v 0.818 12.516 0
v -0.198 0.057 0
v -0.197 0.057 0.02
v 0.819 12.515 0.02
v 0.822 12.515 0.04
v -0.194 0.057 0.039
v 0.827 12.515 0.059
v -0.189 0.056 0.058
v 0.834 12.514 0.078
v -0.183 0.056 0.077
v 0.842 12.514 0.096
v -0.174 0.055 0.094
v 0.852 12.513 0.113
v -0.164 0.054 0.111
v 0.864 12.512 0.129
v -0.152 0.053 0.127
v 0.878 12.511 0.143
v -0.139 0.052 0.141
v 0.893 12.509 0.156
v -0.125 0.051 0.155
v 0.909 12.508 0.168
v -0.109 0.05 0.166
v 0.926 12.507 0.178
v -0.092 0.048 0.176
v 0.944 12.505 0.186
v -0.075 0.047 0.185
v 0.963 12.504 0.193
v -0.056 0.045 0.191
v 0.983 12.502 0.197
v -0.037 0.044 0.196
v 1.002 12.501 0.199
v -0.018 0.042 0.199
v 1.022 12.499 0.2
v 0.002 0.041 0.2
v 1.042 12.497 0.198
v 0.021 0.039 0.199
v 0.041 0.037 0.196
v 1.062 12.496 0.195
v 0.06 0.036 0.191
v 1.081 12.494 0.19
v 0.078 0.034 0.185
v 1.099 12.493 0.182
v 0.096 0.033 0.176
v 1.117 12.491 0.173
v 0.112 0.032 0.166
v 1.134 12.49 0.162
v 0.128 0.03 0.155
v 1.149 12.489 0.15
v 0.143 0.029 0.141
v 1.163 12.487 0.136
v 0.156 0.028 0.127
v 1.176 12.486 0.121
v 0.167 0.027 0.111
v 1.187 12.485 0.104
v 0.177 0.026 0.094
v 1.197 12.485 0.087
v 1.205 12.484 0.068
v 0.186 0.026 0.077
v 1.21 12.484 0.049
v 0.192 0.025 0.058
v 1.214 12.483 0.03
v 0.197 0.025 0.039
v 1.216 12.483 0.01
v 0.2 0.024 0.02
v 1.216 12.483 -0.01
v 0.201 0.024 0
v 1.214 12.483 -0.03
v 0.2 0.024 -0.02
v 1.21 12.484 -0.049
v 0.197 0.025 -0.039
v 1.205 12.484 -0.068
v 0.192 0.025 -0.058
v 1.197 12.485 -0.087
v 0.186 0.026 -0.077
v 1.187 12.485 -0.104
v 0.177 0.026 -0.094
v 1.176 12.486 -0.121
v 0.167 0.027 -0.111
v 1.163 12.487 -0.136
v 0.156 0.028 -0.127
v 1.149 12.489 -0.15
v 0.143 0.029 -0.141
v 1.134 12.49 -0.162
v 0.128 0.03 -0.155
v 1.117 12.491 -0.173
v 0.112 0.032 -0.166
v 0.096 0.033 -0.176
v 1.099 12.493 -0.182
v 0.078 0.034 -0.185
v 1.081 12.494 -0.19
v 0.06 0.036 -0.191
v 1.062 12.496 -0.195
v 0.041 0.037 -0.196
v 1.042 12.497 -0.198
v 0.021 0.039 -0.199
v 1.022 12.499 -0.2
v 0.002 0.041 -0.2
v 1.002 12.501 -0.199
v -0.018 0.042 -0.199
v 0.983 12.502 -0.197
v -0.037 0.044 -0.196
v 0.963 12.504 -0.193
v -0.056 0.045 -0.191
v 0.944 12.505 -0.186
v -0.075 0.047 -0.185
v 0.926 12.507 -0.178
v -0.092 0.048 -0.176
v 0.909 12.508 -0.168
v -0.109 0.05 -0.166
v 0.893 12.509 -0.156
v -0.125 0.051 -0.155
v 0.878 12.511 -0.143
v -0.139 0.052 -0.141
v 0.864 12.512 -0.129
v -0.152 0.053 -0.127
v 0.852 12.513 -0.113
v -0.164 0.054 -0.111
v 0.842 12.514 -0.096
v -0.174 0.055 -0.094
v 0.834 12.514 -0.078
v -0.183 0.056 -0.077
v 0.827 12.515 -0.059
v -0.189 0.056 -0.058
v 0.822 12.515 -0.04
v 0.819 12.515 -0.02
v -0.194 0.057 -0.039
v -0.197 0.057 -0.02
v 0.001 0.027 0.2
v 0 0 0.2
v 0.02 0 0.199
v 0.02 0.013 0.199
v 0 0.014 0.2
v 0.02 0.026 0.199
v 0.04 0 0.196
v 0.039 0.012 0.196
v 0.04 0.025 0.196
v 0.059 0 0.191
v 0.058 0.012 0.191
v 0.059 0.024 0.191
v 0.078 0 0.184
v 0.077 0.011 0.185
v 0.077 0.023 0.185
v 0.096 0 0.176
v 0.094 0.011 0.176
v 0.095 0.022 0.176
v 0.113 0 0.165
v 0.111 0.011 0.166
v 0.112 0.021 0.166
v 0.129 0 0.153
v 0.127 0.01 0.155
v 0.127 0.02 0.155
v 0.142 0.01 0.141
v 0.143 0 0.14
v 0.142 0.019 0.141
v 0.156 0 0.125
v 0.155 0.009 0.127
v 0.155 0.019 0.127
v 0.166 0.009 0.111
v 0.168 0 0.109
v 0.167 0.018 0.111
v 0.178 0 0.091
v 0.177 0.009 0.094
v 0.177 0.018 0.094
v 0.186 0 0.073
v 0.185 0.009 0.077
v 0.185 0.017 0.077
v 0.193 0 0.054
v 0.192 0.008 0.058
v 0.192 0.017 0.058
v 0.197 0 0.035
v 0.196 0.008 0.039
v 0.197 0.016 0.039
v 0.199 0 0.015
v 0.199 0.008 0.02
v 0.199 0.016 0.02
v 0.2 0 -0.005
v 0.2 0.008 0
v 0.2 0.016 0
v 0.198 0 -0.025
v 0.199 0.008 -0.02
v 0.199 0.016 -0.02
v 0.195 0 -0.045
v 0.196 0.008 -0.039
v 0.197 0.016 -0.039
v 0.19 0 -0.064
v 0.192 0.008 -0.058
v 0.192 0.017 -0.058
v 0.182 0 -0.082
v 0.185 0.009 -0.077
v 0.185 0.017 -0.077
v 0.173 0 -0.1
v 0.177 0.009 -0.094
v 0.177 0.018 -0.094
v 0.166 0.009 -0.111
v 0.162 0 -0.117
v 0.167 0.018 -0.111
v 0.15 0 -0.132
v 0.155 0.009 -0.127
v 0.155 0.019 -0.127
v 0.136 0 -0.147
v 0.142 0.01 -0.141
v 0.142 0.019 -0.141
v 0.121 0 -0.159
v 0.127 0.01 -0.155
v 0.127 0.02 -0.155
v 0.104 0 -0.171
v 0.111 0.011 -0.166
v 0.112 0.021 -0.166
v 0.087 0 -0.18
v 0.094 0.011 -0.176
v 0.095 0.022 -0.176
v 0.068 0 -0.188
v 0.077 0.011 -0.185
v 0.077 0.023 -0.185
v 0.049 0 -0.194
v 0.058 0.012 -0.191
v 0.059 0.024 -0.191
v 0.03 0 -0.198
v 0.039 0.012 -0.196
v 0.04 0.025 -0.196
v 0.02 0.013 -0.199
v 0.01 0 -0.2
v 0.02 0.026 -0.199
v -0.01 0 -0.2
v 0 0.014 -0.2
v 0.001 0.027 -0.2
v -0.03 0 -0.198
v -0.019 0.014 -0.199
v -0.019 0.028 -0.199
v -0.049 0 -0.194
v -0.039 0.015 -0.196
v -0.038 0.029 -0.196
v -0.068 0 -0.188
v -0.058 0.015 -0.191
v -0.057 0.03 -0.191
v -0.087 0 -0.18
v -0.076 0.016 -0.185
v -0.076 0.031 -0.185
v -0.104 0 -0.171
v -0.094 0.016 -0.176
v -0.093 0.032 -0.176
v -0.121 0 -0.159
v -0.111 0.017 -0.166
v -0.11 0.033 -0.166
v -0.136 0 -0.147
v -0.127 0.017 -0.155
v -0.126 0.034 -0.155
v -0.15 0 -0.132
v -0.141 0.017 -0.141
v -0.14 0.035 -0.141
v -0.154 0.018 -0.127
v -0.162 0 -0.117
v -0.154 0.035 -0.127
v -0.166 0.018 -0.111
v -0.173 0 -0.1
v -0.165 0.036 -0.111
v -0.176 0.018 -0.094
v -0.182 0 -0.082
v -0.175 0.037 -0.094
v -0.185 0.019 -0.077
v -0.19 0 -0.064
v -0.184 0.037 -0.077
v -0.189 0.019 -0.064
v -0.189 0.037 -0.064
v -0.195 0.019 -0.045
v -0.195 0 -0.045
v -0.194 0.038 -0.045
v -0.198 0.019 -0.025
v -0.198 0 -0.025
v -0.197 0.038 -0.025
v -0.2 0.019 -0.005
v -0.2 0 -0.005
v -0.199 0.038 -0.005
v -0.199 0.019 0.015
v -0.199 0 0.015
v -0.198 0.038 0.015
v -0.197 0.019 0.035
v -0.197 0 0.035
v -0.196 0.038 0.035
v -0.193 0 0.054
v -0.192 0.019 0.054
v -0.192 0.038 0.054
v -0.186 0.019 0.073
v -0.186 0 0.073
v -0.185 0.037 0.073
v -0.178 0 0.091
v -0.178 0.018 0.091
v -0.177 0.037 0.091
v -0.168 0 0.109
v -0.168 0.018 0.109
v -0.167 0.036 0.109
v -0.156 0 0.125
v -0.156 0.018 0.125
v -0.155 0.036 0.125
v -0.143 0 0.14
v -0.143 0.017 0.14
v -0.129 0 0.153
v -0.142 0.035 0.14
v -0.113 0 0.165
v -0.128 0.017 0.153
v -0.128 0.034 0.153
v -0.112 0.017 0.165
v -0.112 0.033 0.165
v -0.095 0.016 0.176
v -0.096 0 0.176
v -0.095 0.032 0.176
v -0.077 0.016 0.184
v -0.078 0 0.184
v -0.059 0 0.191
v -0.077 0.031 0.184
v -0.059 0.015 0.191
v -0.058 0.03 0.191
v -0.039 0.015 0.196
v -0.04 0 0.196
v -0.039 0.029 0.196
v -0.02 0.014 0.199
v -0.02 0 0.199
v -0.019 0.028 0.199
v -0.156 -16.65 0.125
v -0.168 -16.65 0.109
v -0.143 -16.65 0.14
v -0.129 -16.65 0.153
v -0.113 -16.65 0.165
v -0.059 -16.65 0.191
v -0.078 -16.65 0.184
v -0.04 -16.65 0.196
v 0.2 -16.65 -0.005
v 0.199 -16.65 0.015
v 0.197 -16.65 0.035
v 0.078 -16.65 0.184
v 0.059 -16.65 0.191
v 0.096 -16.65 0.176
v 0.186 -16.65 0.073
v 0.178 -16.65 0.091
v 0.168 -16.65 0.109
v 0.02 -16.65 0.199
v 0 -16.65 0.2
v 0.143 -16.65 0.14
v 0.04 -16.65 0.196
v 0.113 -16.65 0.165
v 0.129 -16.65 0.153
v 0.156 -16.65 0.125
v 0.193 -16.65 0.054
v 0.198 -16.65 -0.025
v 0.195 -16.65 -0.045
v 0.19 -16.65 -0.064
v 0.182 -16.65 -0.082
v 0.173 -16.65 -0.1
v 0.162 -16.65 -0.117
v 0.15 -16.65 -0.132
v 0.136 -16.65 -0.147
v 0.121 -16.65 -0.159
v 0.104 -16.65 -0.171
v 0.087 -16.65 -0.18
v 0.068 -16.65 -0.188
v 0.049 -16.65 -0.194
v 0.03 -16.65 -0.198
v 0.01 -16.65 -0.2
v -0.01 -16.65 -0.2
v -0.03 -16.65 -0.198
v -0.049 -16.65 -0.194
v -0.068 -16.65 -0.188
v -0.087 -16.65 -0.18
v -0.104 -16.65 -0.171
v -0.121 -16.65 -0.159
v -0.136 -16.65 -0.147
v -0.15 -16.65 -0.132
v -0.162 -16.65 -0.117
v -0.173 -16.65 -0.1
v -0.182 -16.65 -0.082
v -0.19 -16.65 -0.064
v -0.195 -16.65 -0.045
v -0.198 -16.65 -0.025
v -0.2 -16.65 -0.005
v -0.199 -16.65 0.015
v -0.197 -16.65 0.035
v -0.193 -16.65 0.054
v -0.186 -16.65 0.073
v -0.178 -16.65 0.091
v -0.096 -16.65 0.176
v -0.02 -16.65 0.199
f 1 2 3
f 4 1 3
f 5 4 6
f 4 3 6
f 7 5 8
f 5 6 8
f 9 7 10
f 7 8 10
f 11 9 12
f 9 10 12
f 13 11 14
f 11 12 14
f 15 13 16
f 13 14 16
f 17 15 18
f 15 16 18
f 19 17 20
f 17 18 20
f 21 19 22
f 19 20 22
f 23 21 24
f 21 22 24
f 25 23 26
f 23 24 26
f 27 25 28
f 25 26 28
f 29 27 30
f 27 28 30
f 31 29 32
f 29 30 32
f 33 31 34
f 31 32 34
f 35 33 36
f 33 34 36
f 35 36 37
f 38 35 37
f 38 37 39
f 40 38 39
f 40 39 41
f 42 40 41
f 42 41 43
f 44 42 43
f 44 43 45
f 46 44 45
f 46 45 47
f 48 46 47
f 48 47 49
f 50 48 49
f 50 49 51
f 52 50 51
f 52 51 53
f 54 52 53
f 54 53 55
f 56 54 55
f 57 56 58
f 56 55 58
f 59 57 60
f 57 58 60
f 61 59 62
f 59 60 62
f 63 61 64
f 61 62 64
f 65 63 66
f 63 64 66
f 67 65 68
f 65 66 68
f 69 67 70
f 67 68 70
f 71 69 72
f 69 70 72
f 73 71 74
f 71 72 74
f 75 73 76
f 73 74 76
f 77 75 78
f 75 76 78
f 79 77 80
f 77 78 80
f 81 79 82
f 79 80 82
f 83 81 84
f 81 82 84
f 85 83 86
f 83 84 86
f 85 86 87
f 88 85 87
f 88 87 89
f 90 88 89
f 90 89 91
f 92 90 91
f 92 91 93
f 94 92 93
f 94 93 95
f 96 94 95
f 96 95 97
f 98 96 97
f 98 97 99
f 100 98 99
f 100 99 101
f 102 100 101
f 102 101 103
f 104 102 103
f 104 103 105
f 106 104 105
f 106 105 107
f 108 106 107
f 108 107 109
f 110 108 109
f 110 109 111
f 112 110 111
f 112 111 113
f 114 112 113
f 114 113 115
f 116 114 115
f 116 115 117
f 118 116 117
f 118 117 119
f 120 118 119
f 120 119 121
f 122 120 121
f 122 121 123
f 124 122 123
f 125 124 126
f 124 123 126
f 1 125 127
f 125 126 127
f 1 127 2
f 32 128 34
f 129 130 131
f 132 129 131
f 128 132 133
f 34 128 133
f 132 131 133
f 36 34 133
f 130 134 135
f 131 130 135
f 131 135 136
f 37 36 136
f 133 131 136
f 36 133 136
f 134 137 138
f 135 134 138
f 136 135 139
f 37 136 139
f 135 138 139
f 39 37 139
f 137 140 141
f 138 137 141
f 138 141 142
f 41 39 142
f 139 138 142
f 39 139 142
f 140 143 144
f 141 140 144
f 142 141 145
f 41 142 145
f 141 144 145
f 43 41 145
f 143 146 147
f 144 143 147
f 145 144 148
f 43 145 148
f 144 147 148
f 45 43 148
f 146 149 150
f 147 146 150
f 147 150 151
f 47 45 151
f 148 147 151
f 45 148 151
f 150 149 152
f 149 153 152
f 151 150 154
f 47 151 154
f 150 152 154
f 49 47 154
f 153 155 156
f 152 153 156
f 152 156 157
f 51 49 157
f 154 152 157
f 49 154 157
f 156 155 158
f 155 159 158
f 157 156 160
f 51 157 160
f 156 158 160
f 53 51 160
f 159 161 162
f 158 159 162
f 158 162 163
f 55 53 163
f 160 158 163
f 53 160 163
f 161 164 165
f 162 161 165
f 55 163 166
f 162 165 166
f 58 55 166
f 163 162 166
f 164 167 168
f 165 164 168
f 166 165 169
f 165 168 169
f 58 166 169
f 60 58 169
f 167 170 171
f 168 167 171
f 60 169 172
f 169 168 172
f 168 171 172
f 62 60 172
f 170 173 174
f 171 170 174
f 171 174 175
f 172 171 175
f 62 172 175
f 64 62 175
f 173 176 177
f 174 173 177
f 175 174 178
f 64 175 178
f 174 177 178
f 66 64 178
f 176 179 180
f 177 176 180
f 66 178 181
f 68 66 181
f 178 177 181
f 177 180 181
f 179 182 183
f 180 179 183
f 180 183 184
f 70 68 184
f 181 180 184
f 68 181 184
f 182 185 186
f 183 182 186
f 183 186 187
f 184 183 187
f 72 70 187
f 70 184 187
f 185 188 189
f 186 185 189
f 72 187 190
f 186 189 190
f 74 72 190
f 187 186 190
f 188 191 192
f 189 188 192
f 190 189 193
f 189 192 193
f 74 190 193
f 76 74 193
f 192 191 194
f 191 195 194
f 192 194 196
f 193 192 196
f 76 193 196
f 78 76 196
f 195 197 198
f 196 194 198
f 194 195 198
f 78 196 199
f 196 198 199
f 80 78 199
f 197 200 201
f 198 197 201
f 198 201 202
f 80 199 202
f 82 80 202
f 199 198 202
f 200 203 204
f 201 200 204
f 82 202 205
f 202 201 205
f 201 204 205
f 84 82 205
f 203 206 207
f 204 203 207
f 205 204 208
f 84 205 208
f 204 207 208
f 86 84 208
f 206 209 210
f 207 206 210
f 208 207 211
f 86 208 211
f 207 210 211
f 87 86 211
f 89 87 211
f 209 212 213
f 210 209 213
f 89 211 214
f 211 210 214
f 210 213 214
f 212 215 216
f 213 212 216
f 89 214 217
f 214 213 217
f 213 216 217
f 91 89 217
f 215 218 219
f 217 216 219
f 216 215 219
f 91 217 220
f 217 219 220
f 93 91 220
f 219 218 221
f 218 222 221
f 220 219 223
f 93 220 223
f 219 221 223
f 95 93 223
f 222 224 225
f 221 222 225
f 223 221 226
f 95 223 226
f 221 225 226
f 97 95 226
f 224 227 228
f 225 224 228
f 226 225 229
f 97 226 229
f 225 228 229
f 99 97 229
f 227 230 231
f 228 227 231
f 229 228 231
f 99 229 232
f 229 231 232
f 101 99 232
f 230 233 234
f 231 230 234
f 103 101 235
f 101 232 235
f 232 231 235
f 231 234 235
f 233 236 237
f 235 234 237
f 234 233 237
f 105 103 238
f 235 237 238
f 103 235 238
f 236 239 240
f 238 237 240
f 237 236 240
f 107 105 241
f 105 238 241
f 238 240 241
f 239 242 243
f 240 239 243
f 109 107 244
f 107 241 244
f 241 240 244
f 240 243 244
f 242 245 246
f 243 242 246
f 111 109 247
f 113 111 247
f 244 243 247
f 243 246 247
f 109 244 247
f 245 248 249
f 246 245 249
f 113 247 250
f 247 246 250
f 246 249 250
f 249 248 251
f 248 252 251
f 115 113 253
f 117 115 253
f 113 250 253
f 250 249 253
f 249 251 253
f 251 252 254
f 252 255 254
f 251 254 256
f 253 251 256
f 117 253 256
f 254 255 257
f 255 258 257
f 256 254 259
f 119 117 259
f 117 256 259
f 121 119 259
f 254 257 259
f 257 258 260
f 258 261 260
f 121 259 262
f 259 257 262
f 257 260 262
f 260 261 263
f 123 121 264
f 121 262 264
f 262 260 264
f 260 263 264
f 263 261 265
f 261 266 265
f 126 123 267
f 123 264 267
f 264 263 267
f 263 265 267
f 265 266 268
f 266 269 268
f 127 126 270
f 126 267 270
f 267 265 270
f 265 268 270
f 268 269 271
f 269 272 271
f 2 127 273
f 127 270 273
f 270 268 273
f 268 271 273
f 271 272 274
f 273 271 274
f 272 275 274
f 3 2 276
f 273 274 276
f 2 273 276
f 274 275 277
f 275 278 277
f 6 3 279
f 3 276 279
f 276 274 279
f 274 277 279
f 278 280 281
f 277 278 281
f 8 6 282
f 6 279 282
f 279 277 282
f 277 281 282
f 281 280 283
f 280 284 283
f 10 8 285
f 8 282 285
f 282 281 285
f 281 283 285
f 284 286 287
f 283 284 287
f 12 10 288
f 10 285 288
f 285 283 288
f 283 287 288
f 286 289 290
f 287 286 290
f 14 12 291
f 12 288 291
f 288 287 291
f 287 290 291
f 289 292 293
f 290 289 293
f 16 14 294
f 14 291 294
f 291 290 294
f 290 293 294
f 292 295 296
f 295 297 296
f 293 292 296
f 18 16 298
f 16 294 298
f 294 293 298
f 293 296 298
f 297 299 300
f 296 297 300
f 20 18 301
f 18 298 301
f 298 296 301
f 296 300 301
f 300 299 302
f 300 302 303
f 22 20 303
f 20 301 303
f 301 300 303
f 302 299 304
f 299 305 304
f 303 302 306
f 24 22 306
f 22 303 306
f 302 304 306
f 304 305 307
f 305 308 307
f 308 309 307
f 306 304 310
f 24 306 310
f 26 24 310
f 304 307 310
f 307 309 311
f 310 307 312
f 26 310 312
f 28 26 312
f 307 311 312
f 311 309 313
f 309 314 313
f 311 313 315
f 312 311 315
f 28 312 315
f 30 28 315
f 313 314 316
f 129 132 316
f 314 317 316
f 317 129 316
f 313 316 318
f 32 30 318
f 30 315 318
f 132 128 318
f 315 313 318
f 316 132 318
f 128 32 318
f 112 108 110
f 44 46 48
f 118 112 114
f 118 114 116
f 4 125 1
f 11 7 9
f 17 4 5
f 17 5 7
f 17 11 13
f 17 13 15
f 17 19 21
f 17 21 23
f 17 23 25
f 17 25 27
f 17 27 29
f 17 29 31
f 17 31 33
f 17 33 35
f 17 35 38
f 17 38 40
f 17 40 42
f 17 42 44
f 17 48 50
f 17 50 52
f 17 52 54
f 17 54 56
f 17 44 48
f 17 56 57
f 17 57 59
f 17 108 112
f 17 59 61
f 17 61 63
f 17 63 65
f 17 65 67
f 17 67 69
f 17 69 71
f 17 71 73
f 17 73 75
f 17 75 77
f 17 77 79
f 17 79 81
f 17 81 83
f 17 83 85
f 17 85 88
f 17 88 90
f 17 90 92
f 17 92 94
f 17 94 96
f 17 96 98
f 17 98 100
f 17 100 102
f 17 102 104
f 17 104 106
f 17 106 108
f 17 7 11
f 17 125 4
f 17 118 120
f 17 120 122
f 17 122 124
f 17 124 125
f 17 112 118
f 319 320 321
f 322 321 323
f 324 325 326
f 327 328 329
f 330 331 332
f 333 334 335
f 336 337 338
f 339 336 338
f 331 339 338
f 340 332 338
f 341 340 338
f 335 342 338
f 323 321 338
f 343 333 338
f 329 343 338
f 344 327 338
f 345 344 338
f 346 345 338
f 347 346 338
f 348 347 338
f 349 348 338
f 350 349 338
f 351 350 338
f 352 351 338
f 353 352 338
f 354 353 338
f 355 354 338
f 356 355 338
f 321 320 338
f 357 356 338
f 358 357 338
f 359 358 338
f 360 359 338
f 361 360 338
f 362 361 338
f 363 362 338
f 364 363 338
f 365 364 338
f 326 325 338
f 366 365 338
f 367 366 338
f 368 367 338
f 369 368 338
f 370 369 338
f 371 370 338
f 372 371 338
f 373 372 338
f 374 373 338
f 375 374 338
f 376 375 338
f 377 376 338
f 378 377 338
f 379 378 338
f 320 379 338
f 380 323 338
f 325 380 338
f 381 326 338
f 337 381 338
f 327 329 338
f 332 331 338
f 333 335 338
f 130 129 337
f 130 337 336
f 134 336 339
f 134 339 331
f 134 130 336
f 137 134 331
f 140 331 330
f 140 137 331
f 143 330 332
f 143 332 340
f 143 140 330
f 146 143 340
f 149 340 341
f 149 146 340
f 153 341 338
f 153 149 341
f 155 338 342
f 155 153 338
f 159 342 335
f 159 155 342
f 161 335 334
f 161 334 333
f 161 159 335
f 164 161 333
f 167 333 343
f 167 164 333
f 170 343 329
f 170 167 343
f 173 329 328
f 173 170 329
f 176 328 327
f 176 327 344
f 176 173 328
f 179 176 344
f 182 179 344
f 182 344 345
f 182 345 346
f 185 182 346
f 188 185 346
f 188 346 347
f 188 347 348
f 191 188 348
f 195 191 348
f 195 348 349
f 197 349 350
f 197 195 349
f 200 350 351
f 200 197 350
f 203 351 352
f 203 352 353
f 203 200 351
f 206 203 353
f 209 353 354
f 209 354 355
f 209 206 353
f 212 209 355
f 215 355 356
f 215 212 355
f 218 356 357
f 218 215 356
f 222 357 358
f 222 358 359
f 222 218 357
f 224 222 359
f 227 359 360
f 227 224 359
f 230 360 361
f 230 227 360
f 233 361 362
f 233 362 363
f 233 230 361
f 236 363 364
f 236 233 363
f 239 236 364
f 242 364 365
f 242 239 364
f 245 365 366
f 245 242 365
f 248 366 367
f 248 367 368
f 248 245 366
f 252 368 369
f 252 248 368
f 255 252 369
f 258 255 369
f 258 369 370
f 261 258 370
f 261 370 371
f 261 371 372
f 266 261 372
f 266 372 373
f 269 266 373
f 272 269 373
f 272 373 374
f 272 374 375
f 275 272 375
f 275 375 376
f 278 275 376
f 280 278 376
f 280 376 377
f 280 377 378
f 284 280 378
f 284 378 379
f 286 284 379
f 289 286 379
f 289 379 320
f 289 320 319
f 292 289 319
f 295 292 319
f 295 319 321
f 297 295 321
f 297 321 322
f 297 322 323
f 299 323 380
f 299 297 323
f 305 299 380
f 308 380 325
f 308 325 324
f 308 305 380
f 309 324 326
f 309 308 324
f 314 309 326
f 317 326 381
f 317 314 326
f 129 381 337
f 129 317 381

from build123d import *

# Parameters (mm, degrees)
SKETCH1_R           = 0.2
BOSS_EXTRUDE1_DEPTH = 16.65
SKETCH2_R           = 0.2
REVOLVE1_ANGLE      = 4.66
SKETCH3_R           = 0.2
BOSS_EXTRUDE2_DEPTH = 12.5


with BuildPart() as part:
    # Sketch1 → Boss-Extrude1 (new body)
    with BuildSketch(Plane(origin=(0, 0, 0), x_dir=(1, 0, 0), z_dir=(0, 1, 0))):
        with Locations(Location((0, 0, 0), (0, 0, 270))):
            Circle(SKETCH1_R)
    extrude(amount=-BOSS_EXTRUDE1_DEPTH)

    # Sketch2 → Revolve1 (revolve)
    with BuildSketch(Plane(origin=(0, 0, 0), x_dir=(1, 0, 0), z_dir=(0, 1, 0))):
        with Locations(Location((0, 0, 0), (0, 0, 270))):
            Circle(SKETCH2_R)
    revolve(axis=Axis((0.5, 0, -0.2), (0, 0, -1)), revolution_arc=REVOLVE1_ANGLE)

    # Sketch3 → Boss-Extrude2 (add)
    with BuildSketch(Plane(origin=(0.003300189, 0.040487072, 0), x_dir=(0.9966943478093031, -0.08124270456470586, 0), z_dir=(0.08124270456470586, 0.9966943478093031, 0))):
        with Locations(Location((-0.001652826, 0, 0), (0, 0, 180))):
            Circle(SKETCH3_R)
    extrude(amount=BOSS_EXTRUDE2_DEPTH)


solid = part.part
